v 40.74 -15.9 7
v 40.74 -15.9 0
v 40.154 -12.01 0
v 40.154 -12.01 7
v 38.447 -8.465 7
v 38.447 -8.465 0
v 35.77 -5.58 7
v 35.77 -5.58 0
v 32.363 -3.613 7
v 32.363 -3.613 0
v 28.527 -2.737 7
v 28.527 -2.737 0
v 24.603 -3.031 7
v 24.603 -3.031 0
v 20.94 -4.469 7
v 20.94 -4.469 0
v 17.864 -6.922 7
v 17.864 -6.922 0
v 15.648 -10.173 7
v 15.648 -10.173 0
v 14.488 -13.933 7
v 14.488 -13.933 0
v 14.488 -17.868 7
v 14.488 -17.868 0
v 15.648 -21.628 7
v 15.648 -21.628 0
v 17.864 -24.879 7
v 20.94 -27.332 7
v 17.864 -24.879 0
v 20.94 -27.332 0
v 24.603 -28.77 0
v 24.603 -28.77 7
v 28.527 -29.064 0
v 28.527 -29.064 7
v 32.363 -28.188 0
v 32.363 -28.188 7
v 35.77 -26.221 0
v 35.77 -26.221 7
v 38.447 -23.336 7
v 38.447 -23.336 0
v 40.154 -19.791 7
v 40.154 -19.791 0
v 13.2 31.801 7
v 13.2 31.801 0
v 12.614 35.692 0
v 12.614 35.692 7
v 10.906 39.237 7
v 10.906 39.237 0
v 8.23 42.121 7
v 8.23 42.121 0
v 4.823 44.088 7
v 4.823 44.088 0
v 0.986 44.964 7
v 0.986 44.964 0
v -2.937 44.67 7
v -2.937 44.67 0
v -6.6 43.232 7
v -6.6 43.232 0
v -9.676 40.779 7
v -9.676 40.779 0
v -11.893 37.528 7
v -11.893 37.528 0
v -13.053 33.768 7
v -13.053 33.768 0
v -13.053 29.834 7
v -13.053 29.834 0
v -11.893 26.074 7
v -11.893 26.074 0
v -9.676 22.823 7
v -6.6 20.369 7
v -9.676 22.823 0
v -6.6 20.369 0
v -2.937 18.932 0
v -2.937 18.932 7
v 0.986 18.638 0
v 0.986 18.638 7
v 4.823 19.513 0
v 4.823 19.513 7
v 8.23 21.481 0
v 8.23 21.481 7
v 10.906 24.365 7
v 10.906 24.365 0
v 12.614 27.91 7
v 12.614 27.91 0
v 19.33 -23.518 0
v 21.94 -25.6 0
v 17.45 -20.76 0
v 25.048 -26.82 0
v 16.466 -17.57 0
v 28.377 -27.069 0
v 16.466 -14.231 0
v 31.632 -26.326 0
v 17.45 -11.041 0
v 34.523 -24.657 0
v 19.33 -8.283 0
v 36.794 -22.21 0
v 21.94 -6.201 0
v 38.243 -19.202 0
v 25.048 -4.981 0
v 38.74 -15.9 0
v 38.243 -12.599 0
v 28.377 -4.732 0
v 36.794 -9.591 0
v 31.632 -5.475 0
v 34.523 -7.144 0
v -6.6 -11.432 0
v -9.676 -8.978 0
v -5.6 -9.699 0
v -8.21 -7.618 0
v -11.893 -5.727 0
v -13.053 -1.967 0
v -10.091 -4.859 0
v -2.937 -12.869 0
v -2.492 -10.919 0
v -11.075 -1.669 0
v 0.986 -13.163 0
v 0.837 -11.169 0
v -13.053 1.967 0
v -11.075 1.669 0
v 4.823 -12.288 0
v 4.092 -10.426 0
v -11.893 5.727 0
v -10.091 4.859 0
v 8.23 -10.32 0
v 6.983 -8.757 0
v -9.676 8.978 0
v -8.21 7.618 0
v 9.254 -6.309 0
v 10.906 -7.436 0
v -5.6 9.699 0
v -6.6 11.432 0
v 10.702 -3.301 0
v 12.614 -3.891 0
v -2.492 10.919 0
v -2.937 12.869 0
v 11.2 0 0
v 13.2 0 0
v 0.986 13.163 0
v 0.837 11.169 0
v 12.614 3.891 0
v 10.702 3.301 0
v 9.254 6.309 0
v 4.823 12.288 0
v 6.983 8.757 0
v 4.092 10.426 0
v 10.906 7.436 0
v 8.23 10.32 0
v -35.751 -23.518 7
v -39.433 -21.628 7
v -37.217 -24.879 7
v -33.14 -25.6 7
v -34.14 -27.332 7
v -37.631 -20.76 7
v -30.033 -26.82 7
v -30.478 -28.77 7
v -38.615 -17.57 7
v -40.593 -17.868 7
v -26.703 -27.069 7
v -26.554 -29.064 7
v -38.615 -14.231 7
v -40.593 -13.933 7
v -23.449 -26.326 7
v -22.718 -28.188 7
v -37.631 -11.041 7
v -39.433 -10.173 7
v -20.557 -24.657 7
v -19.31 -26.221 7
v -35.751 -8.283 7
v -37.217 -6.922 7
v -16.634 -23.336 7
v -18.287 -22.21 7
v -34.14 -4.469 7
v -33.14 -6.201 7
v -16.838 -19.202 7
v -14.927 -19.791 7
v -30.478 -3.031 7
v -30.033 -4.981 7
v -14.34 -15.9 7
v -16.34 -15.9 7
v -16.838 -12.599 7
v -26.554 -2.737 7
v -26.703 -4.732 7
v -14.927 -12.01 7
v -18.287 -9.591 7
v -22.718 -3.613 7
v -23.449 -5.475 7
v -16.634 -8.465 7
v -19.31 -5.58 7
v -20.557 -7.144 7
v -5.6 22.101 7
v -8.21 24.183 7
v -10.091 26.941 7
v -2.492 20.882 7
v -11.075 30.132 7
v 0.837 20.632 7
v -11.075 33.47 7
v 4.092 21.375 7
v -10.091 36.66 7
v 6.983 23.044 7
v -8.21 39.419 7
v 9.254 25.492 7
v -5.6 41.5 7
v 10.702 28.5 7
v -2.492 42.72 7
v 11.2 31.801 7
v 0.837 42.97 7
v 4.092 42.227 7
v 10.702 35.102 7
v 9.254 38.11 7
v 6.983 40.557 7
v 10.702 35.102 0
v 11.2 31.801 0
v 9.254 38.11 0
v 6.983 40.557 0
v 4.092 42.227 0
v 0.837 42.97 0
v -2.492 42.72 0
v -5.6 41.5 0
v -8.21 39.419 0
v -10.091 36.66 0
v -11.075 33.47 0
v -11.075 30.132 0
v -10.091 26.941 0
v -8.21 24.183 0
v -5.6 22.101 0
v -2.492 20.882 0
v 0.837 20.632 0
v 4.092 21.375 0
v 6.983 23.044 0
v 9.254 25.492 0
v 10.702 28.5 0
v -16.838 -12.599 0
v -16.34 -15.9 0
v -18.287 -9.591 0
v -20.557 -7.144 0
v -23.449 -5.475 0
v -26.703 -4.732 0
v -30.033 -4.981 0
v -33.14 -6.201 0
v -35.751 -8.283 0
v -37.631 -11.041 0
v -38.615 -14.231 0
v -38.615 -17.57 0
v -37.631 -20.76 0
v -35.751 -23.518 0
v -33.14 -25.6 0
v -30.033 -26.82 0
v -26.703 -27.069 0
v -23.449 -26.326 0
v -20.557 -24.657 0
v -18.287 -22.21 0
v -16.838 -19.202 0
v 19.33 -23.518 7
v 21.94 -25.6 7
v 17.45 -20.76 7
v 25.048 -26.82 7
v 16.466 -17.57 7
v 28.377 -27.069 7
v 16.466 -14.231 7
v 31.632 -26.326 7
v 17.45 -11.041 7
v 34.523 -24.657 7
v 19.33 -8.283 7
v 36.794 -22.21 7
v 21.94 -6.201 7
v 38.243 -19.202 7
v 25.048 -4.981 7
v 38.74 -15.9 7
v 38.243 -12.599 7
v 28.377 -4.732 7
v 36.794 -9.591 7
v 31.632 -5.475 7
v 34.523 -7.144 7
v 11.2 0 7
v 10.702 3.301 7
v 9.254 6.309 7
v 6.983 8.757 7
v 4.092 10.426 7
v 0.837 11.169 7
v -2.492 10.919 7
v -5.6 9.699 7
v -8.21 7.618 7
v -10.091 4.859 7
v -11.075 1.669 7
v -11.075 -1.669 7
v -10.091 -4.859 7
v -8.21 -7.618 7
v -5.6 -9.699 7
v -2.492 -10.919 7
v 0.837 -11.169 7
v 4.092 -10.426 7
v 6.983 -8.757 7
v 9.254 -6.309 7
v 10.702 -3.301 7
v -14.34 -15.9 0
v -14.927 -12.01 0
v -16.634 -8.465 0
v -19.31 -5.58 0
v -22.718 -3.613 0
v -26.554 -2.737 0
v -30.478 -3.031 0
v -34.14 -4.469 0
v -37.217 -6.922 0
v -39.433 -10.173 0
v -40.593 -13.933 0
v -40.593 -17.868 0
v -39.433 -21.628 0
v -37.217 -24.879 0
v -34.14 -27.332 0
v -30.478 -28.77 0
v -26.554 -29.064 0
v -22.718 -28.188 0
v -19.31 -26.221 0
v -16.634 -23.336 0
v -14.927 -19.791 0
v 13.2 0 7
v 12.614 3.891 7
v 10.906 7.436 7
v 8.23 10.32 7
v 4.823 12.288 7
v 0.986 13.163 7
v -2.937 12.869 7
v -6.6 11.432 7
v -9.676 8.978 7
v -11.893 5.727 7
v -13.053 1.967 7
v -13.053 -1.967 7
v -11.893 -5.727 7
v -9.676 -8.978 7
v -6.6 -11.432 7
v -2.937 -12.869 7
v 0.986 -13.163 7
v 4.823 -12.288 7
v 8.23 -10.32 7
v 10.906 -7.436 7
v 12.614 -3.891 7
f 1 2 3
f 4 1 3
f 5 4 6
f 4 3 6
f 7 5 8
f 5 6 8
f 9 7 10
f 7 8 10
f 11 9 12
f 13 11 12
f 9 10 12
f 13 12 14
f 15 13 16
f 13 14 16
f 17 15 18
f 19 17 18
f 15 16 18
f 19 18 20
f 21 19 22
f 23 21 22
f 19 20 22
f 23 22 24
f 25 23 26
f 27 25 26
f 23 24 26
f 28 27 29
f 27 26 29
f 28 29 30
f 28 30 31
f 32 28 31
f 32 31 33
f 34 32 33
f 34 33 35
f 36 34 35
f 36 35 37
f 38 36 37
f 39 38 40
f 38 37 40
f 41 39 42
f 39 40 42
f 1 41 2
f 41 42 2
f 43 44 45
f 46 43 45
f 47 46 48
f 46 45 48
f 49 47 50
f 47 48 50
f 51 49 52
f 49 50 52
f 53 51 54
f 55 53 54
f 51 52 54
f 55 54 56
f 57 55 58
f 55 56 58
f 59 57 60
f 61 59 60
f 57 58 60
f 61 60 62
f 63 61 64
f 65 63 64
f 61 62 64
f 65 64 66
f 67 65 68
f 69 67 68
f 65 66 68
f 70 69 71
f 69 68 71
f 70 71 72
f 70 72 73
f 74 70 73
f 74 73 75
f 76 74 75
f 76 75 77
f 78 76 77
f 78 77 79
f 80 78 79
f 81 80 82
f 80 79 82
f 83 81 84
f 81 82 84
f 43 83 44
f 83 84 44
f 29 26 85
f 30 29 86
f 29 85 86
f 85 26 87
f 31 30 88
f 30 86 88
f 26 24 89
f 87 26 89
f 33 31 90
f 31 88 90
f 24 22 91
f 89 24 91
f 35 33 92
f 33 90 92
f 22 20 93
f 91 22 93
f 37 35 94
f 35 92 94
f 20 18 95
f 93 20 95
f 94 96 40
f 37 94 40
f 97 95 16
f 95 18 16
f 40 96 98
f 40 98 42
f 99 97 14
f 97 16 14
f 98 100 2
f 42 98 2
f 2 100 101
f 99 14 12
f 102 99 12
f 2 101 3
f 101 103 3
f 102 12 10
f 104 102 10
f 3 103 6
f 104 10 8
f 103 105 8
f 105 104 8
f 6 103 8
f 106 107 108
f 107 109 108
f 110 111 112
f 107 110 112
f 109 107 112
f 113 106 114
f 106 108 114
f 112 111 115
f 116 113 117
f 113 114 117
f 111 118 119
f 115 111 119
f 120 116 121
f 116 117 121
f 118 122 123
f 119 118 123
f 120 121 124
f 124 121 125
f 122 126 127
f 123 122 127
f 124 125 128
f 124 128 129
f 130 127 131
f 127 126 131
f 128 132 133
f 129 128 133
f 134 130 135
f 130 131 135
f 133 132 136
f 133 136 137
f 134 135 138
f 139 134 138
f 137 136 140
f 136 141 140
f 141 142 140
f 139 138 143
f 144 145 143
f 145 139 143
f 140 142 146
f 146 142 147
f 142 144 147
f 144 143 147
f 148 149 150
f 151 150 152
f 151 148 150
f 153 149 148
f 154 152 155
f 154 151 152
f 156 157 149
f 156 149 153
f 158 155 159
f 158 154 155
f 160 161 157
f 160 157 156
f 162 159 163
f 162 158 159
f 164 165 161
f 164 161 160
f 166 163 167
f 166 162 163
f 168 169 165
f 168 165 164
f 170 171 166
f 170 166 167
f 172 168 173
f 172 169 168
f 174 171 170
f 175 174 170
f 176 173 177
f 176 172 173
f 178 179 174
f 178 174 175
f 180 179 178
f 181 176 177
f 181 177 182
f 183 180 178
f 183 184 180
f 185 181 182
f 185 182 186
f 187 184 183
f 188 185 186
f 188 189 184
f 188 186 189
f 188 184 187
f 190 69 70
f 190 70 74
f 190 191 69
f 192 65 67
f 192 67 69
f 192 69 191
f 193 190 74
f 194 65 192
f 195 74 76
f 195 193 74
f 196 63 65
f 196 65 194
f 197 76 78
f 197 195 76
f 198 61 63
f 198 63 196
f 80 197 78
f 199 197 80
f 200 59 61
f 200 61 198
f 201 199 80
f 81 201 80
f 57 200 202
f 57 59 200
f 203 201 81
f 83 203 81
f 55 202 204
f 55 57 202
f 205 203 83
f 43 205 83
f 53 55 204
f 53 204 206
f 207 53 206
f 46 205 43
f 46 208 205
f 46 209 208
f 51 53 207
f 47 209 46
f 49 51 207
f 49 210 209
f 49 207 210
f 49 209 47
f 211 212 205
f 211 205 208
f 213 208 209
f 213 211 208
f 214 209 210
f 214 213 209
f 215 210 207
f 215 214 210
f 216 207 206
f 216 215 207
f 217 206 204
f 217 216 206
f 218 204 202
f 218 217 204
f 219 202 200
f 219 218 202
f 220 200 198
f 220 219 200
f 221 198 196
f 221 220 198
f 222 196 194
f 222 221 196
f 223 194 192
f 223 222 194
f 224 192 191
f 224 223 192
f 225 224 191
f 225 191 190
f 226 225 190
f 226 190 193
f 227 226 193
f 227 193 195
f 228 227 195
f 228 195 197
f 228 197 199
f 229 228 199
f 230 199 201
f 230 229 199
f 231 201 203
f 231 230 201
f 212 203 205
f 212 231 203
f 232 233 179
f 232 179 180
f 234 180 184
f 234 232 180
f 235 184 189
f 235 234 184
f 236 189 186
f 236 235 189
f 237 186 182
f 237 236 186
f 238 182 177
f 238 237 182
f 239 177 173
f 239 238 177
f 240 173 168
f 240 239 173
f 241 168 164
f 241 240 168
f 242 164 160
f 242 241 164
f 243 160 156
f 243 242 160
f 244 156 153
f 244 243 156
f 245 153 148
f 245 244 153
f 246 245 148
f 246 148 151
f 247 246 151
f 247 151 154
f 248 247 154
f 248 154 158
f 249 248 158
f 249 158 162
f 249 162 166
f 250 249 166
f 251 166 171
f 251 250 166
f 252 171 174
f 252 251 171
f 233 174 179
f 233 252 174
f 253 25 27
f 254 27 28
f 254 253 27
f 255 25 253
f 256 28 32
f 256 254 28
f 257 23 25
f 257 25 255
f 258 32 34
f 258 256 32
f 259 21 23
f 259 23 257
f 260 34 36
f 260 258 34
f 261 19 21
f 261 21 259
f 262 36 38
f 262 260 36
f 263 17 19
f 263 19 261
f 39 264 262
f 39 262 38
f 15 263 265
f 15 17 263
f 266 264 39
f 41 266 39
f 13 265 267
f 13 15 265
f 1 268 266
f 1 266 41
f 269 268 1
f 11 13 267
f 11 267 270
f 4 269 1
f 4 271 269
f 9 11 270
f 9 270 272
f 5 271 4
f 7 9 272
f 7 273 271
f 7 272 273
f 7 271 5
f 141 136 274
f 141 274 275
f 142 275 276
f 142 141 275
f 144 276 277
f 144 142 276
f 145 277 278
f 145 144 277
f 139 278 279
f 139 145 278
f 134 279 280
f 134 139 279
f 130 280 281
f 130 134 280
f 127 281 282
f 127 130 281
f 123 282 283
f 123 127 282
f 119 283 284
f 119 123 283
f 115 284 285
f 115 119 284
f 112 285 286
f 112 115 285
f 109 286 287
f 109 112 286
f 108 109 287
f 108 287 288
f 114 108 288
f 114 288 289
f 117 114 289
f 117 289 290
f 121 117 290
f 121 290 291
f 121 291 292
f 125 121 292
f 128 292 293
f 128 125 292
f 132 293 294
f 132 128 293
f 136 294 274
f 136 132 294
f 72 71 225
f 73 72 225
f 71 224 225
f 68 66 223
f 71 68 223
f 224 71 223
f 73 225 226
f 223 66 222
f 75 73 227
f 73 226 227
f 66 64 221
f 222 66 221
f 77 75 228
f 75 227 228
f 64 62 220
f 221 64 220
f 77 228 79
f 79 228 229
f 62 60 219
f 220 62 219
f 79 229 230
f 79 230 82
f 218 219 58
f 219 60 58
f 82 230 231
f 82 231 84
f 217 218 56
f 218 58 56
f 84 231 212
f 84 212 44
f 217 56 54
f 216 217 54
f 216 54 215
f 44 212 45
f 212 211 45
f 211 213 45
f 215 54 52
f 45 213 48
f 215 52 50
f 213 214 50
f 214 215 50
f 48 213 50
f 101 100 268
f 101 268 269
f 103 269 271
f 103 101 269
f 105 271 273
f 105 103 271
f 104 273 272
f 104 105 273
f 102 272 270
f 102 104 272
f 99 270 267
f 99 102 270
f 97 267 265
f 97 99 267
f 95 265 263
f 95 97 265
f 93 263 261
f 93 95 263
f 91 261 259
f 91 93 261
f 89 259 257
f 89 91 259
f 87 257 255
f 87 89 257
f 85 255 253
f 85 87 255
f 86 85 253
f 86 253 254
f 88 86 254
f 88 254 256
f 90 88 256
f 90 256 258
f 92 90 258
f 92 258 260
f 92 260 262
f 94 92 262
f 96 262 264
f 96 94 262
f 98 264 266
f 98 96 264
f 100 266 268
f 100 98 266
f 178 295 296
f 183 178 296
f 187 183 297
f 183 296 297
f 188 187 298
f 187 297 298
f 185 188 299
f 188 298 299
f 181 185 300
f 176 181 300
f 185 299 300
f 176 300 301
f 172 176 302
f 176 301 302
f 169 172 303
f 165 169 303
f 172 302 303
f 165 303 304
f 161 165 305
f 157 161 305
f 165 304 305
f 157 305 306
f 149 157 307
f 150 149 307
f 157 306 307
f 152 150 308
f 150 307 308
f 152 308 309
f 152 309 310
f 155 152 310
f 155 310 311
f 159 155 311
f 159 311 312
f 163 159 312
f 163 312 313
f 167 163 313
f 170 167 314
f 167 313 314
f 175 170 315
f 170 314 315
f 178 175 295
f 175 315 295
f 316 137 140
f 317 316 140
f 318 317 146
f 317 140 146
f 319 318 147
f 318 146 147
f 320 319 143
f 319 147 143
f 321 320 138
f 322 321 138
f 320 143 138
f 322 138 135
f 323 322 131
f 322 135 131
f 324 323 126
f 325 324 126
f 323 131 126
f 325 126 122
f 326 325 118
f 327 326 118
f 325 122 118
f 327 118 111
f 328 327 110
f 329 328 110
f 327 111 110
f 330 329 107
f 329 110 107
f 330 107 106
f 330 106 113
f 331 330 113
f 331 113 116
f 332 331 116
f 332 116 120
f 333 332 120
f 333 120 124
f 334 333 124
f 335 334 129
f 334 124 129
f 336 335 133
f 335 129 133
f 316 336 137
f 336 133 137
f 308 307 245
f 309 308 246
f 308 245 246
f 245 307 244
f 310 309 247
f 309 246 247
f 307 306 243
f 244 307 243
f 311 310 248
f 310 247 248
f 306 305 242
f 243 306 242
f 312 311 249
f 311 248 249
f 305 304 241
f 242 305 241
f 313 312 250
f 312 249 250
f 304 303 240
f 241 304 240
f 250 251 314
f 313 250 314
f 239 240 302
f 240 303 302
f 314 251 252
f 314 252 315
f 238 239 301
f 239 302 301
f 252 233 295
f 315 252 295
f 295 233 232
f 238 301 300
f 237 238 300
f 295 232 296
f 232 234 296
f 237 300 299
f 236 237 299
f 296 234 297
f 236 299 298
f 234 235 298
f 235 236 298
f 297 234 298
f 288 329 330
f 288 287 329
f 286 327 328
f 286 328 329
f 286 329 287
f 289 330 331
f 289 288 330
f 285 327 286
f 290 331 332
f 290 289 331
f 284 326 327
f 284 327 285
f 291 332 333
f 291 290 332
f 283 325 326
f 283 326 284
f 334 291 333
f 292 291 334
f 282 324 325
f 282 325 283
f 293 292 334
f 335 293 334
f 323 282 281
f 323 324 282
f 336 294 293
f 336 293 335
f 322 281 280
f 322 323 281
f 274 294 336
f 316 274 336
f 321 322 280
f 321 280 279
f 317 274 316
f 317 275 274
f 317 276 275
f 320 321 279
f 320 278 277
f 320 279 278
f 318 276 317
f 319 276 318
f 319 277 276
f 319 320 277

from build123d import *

# Parameters (mm, degrees)
F0_R     = 13.2
F0_R_2   = 11.2
F2_DEPTH = 7


# Not quite as in the source:
# - the program builds the solid bodies; features that only make, move or delete a surface that nothing else refers to are left out


with BuildPart() as f2:
    # F0 (on Top) → F2 (new body)
    with BuildSketch(Plane.XY):
        with Locations((0, 31.8009220064)):
            Circle(F0_R)
        with Locations((0, 31.8009220064)):
            Circle(F0_R_2, mode=Mode.SUBTRACT)
    extrude(amount=F2_DEPTH)


with BuildPart() as f2b:
    # F0 (on Top) → F2, piece 2 (new body)
    with BuildSketch(Plane.XY):
        with Locations((27.5404063213, -15.9004610032)):
            Circle(F0_R)
        with Locations((27.5404063213, -15.9004610032)):
            Circle(F0_R_2, mode=Mode.SUBTRACT)
    extrude(amount=F2_DEPTH)


with BuildPart() as f2c:
    # F0 (on Top) → F2, piece 3 (new body)
    with BuildSketch(Plane.XY):
        Circle(F0_R)
        Circle(F0_R_2, mode=Mode.SUBTRACT)
    extrude(amount=F2_DEPTH)


with BuildPart() as f2d:
    # F0 (on Top) → F2, piece 4 (new body)
    with BuildSketch(Plane.XY):
        with Locations((-27.5404063213, -15.9004610032)):
            Circle(F0_R)
        with Locations((-27.5404063213, -15.9004610032)):
            Circle(F0_R_2, mode=Mode.SUBTRACT)
    extrude(amount=F2_DEPTH)


solid = Compound([f2.part, f2b.part, f2c.part, f2d.part])
